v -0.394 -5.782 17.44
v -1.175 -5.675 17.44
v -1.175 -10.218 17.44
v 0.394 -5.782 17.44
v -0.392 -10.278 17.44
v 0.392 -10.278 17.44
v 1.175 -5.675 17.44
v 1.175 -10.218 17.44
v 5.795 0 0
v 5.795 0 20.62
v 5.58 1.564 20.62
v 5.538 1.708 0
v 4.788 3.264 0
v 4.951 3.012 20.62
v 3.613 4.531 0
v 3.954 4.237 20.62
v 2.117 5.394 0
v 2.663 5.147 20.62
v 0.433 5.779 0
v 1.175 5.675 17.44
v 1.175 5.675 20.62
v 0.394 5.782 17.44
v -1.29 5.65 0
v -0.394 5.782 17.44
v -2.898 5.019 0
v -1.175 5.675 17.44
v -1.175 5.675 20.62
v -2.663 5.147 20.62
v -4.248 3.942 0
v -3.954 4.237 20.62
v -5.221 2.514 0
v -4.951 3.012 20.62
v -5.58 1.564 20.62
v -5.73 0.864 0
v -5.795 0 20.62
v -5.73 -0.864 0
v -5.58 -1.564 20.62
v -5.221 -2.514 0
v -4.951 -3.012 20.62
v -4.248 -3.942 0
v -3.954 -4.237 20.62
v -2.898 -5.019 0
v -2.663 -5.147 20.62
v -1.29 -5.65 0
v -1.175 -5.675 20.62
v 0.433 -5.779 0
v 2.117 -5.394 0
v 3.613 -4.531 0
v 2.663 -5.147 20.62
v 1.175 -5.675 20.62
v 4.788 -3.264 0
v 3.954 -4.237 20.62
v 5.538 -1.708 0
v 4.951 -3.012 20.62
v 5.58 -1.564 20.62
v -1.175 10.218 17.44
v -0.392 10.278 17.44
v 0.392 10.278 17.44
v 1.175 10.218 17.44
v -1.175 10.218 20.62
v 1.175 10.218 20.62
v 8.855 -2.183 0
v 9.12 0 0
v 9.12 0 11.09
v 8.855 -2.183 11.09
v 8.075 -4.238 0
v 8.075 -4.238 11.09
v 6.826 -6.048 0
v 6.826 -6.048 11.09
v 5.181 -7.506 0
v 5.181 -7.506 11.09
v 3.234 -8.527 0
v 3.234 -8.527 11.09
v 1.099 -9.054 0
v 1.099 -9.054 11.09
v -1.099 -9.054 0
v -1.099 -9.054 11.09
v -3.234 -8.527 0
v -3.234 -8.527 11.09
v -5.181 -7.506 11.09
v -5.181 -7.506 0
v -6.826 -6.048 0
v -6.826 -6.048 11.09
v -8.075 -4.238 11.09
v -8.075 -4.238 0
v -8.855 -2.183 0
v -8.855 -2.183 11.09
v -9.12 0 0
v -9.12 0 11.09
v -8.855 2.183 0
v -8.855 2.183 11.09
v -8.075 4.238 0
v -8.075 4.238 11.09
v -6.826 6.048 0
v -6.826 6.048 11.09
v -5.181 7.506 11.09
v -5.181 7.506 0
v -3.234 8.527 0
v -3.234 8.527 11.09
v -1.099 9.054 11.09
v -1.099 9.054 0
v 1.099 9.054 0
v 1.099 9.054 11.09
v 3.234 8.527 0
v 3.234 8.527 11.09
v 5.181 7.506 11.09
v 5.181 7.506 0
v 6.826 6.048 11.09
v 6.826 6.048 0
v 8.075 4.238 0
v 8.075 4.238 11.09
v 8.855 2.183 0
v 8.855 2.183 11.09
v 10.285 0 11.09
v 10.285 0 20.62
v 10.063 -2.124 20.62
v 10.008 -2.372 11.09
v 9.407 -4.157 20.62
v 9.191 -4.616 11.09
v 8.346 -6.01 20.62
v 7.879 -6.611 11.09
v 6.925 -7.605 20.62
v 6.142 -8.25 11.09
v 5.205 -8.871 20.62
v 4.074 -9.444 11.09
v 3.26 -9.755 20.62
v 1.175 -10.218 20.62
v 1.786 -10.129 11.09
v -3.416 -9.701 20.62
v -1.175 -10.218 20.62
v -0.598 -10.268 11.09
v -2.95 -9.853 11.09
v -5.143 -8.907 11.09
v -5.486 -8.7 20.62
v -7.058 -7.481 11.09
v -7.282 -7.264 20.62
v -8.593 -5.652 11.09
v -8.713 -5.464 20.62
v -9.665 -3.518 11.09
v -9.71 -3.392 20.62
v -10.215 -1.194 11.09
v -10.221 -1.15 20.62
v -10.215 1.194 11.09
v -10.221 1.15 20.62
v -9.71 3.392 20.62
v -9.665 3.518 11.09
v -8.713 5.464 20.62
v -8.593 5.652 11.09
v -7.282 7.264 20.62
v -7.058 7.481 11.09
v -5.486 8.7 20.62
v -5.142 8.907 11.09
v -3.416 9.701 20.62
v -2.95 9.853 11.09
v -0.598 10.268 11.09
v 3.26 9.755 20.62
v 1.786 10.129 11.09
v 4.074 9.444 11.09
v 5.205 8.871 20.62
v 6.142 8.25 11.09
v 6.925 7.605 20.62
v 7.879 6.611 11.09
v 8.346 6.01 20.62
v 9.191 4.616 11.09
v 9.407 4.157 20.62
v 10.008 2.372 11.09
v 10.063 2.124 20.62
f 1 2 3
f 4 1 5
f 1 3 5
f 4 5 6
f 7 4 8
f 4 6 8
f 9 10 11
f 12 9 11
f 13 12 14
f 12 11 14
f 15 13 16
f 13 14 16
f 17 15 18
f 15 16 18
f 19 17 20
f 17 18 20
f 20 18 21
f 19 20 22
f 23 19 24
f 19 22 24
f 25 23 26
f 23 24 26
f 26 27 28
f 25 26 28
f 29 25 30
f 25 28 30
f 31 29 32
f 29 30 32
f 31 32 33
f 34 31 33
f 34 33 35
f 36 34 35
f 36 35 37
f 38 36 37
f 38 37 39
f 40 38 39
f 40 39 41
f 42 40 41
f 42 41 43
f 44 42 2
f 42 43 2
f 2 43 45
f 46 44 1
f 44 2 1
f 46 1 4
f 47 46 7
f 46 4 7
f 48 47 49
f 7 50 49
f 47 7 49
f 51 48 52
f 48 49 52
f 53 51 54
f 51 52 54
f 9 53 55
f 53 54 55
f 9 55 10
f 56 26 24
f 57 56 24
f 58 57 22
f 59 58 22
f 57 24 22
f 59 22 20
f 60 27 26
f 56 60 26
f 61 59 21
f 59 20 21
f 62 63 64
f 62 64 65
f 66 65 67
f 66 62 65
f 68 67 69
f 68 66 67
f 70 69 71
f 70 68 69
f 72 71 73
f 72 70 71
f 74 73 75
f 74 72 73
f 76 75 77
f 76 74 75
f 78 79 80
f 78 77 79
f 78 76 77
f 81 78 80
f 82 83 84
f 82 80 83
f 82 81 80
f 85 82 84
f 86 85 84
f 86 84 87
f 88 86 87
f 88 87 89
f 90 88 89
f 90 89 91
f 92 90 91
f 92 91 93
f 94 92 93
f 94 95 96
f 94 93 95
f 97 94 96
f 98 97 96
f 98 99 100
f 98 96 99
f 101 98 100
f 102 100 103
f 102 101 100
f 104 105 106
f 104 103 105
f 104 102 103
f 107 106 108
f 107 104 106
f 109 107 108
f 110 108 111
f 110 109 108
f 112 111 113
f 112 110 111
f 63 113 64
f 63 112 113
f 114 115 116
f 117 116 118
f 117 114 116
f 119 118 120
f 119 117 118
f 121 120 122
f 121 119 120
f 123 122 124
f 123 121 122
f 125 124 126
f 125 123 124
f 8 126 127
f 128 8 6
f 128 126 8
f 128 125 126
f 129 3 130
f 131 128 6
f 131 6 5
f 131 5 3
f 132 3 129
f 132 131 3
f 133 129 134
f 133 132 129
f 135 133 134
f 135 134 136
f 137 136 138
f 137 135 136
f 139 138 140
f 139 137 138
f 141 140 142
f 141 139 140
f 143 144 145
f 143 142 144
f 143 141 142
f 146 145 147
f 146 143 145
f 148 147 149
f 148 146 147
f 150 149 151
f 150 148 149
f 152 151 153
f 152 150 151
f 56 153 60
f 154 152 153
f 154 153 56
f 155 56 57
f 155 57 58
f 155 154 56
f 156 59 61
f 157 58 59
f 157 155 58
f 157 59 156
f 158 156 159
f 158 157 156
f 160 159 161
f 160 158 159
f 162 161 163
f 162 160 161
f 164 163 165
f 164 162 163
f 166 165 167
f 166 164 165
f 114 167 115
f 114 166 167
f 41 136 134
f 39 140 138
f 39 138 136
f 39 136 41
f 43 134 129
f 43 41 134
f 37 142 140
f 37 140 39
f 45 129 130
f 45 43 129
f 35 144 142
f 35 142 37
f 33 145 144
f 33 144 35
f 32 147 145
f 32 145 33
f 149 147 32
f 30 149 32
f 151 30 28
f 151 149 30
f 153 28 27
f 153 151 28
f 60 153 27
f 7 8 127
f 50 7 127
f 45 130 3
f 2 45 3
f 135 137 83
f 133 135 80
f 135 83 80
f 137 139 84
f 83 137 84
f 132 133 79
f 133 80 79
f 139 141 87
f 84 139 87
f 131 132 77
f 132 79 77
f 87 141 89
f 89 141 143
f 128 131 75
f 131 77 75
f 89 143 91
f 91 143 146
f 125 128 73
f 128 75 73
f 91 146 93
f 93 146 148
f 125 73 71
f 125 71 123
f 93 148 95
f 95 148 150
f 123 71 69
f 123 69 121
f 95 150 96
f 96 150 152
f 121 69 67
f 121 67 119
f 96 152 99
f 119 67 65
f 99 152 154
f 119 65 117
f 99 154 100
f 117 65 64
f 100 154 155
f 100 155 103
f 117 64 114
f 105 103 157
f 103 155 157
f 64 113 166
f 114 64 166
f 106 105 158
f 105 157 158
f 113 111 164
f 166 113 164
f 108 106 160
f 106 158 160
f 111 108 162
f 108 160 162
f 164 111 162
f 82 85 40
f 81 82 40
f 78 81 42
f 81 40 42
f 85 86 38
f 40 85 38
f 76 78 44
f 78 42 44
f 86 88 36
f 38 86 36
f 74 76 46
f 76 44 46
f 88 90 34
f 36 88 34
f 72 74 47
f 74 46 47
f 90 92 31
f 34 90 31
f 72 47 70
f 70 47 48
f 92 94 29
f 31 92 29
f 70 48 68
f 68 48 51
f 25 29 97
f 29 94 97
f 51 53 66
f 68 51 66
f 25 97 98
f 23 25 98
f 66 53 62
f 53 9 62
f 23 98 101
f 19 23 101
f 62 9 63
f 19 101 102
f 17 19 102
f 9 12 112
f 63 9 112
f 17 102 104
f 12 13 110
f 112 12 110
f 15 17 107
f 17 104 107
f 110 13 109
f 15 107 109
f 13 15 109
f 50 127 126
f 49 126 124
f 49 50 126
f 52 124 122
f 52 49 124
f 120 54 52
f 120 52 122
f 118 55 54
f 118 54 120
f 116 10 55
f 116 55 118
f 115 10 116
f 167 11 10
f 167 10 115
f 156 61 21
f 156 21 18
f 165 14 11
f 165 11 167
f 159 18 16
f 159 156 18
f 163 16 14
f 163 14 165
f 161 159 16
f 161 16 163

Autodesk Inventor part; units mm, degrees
ref_plane "YZ Plane" through (0, 0, 0) normal (1, 0, 0) x (0, 1, 0)
ref_plane "XZ Plane" through (0, 0, 0) normal (0, 1, 0) x (-1, 0, 0)
ref_plane "XY Plane" through (0, 0, 0) normal (0, 0, 1) x (1, 0, 0)
sketch "Sketch1" plane through (0, 0, 0) normal (0, 0, 1) x (1, 0, 0)
  circle A0 centre (0, 0) radius 9.12
  dimension "d0" = 18.24
extrude "Extrusion1" add sketch "Sketch1" along normal blind 11.09
sketch "Sketch2" plane through (0, 0, 11.09) normal (0, 0, 1) x (1, 0, 0)
  circle A0 centre (0, 0) radius 10.285
  dimension "d3" = 20.57
extrude "Extrusion2" add sketch "Sketch2" along normal blind 9.53
sketch "Sketch3" plane through (0, 0, 20.62) normal (0, 0, 1) x (1, 0, 0)
  circle A0 centre (0, 0) radius 5.795
  dimension "d6" = 11.59
extrude "Extrusion3" cut sketch "Sketch3" against normal blind 33.78
sketch "Sketch4" plane through (0, 0, 0) normal (0, 1, 0) x (-1, 0, 0)
  line L0 (1.175, 17.44) -> (-1.175, 17.44)
  line L1 (-1.175, 17.44) -> (-1.175, 23.8)
  line L2 (-1.175, 23.8) -> (1.175, 23.8)
  line L3 (1.175, 23.8) -> (1.175, 17.44)
  line L4 (10.285, 20.62) -> (-10.285, 20.62) projected
  line L5 (1.175, 17.44) -> (-1.175, 23.8) construction
  line L6 (-1.175, 17.44) -> (1.175, 23.8) construction
  point P0 (0, 0)
  point P1 (0, 20.62)
  dimension "d9" = 2.35
  dimension "d10" = 6.36
extrude "Extrusion4" cut sketch "Sketch4" along normal mid plane 33.78
properties part number "parça5"
